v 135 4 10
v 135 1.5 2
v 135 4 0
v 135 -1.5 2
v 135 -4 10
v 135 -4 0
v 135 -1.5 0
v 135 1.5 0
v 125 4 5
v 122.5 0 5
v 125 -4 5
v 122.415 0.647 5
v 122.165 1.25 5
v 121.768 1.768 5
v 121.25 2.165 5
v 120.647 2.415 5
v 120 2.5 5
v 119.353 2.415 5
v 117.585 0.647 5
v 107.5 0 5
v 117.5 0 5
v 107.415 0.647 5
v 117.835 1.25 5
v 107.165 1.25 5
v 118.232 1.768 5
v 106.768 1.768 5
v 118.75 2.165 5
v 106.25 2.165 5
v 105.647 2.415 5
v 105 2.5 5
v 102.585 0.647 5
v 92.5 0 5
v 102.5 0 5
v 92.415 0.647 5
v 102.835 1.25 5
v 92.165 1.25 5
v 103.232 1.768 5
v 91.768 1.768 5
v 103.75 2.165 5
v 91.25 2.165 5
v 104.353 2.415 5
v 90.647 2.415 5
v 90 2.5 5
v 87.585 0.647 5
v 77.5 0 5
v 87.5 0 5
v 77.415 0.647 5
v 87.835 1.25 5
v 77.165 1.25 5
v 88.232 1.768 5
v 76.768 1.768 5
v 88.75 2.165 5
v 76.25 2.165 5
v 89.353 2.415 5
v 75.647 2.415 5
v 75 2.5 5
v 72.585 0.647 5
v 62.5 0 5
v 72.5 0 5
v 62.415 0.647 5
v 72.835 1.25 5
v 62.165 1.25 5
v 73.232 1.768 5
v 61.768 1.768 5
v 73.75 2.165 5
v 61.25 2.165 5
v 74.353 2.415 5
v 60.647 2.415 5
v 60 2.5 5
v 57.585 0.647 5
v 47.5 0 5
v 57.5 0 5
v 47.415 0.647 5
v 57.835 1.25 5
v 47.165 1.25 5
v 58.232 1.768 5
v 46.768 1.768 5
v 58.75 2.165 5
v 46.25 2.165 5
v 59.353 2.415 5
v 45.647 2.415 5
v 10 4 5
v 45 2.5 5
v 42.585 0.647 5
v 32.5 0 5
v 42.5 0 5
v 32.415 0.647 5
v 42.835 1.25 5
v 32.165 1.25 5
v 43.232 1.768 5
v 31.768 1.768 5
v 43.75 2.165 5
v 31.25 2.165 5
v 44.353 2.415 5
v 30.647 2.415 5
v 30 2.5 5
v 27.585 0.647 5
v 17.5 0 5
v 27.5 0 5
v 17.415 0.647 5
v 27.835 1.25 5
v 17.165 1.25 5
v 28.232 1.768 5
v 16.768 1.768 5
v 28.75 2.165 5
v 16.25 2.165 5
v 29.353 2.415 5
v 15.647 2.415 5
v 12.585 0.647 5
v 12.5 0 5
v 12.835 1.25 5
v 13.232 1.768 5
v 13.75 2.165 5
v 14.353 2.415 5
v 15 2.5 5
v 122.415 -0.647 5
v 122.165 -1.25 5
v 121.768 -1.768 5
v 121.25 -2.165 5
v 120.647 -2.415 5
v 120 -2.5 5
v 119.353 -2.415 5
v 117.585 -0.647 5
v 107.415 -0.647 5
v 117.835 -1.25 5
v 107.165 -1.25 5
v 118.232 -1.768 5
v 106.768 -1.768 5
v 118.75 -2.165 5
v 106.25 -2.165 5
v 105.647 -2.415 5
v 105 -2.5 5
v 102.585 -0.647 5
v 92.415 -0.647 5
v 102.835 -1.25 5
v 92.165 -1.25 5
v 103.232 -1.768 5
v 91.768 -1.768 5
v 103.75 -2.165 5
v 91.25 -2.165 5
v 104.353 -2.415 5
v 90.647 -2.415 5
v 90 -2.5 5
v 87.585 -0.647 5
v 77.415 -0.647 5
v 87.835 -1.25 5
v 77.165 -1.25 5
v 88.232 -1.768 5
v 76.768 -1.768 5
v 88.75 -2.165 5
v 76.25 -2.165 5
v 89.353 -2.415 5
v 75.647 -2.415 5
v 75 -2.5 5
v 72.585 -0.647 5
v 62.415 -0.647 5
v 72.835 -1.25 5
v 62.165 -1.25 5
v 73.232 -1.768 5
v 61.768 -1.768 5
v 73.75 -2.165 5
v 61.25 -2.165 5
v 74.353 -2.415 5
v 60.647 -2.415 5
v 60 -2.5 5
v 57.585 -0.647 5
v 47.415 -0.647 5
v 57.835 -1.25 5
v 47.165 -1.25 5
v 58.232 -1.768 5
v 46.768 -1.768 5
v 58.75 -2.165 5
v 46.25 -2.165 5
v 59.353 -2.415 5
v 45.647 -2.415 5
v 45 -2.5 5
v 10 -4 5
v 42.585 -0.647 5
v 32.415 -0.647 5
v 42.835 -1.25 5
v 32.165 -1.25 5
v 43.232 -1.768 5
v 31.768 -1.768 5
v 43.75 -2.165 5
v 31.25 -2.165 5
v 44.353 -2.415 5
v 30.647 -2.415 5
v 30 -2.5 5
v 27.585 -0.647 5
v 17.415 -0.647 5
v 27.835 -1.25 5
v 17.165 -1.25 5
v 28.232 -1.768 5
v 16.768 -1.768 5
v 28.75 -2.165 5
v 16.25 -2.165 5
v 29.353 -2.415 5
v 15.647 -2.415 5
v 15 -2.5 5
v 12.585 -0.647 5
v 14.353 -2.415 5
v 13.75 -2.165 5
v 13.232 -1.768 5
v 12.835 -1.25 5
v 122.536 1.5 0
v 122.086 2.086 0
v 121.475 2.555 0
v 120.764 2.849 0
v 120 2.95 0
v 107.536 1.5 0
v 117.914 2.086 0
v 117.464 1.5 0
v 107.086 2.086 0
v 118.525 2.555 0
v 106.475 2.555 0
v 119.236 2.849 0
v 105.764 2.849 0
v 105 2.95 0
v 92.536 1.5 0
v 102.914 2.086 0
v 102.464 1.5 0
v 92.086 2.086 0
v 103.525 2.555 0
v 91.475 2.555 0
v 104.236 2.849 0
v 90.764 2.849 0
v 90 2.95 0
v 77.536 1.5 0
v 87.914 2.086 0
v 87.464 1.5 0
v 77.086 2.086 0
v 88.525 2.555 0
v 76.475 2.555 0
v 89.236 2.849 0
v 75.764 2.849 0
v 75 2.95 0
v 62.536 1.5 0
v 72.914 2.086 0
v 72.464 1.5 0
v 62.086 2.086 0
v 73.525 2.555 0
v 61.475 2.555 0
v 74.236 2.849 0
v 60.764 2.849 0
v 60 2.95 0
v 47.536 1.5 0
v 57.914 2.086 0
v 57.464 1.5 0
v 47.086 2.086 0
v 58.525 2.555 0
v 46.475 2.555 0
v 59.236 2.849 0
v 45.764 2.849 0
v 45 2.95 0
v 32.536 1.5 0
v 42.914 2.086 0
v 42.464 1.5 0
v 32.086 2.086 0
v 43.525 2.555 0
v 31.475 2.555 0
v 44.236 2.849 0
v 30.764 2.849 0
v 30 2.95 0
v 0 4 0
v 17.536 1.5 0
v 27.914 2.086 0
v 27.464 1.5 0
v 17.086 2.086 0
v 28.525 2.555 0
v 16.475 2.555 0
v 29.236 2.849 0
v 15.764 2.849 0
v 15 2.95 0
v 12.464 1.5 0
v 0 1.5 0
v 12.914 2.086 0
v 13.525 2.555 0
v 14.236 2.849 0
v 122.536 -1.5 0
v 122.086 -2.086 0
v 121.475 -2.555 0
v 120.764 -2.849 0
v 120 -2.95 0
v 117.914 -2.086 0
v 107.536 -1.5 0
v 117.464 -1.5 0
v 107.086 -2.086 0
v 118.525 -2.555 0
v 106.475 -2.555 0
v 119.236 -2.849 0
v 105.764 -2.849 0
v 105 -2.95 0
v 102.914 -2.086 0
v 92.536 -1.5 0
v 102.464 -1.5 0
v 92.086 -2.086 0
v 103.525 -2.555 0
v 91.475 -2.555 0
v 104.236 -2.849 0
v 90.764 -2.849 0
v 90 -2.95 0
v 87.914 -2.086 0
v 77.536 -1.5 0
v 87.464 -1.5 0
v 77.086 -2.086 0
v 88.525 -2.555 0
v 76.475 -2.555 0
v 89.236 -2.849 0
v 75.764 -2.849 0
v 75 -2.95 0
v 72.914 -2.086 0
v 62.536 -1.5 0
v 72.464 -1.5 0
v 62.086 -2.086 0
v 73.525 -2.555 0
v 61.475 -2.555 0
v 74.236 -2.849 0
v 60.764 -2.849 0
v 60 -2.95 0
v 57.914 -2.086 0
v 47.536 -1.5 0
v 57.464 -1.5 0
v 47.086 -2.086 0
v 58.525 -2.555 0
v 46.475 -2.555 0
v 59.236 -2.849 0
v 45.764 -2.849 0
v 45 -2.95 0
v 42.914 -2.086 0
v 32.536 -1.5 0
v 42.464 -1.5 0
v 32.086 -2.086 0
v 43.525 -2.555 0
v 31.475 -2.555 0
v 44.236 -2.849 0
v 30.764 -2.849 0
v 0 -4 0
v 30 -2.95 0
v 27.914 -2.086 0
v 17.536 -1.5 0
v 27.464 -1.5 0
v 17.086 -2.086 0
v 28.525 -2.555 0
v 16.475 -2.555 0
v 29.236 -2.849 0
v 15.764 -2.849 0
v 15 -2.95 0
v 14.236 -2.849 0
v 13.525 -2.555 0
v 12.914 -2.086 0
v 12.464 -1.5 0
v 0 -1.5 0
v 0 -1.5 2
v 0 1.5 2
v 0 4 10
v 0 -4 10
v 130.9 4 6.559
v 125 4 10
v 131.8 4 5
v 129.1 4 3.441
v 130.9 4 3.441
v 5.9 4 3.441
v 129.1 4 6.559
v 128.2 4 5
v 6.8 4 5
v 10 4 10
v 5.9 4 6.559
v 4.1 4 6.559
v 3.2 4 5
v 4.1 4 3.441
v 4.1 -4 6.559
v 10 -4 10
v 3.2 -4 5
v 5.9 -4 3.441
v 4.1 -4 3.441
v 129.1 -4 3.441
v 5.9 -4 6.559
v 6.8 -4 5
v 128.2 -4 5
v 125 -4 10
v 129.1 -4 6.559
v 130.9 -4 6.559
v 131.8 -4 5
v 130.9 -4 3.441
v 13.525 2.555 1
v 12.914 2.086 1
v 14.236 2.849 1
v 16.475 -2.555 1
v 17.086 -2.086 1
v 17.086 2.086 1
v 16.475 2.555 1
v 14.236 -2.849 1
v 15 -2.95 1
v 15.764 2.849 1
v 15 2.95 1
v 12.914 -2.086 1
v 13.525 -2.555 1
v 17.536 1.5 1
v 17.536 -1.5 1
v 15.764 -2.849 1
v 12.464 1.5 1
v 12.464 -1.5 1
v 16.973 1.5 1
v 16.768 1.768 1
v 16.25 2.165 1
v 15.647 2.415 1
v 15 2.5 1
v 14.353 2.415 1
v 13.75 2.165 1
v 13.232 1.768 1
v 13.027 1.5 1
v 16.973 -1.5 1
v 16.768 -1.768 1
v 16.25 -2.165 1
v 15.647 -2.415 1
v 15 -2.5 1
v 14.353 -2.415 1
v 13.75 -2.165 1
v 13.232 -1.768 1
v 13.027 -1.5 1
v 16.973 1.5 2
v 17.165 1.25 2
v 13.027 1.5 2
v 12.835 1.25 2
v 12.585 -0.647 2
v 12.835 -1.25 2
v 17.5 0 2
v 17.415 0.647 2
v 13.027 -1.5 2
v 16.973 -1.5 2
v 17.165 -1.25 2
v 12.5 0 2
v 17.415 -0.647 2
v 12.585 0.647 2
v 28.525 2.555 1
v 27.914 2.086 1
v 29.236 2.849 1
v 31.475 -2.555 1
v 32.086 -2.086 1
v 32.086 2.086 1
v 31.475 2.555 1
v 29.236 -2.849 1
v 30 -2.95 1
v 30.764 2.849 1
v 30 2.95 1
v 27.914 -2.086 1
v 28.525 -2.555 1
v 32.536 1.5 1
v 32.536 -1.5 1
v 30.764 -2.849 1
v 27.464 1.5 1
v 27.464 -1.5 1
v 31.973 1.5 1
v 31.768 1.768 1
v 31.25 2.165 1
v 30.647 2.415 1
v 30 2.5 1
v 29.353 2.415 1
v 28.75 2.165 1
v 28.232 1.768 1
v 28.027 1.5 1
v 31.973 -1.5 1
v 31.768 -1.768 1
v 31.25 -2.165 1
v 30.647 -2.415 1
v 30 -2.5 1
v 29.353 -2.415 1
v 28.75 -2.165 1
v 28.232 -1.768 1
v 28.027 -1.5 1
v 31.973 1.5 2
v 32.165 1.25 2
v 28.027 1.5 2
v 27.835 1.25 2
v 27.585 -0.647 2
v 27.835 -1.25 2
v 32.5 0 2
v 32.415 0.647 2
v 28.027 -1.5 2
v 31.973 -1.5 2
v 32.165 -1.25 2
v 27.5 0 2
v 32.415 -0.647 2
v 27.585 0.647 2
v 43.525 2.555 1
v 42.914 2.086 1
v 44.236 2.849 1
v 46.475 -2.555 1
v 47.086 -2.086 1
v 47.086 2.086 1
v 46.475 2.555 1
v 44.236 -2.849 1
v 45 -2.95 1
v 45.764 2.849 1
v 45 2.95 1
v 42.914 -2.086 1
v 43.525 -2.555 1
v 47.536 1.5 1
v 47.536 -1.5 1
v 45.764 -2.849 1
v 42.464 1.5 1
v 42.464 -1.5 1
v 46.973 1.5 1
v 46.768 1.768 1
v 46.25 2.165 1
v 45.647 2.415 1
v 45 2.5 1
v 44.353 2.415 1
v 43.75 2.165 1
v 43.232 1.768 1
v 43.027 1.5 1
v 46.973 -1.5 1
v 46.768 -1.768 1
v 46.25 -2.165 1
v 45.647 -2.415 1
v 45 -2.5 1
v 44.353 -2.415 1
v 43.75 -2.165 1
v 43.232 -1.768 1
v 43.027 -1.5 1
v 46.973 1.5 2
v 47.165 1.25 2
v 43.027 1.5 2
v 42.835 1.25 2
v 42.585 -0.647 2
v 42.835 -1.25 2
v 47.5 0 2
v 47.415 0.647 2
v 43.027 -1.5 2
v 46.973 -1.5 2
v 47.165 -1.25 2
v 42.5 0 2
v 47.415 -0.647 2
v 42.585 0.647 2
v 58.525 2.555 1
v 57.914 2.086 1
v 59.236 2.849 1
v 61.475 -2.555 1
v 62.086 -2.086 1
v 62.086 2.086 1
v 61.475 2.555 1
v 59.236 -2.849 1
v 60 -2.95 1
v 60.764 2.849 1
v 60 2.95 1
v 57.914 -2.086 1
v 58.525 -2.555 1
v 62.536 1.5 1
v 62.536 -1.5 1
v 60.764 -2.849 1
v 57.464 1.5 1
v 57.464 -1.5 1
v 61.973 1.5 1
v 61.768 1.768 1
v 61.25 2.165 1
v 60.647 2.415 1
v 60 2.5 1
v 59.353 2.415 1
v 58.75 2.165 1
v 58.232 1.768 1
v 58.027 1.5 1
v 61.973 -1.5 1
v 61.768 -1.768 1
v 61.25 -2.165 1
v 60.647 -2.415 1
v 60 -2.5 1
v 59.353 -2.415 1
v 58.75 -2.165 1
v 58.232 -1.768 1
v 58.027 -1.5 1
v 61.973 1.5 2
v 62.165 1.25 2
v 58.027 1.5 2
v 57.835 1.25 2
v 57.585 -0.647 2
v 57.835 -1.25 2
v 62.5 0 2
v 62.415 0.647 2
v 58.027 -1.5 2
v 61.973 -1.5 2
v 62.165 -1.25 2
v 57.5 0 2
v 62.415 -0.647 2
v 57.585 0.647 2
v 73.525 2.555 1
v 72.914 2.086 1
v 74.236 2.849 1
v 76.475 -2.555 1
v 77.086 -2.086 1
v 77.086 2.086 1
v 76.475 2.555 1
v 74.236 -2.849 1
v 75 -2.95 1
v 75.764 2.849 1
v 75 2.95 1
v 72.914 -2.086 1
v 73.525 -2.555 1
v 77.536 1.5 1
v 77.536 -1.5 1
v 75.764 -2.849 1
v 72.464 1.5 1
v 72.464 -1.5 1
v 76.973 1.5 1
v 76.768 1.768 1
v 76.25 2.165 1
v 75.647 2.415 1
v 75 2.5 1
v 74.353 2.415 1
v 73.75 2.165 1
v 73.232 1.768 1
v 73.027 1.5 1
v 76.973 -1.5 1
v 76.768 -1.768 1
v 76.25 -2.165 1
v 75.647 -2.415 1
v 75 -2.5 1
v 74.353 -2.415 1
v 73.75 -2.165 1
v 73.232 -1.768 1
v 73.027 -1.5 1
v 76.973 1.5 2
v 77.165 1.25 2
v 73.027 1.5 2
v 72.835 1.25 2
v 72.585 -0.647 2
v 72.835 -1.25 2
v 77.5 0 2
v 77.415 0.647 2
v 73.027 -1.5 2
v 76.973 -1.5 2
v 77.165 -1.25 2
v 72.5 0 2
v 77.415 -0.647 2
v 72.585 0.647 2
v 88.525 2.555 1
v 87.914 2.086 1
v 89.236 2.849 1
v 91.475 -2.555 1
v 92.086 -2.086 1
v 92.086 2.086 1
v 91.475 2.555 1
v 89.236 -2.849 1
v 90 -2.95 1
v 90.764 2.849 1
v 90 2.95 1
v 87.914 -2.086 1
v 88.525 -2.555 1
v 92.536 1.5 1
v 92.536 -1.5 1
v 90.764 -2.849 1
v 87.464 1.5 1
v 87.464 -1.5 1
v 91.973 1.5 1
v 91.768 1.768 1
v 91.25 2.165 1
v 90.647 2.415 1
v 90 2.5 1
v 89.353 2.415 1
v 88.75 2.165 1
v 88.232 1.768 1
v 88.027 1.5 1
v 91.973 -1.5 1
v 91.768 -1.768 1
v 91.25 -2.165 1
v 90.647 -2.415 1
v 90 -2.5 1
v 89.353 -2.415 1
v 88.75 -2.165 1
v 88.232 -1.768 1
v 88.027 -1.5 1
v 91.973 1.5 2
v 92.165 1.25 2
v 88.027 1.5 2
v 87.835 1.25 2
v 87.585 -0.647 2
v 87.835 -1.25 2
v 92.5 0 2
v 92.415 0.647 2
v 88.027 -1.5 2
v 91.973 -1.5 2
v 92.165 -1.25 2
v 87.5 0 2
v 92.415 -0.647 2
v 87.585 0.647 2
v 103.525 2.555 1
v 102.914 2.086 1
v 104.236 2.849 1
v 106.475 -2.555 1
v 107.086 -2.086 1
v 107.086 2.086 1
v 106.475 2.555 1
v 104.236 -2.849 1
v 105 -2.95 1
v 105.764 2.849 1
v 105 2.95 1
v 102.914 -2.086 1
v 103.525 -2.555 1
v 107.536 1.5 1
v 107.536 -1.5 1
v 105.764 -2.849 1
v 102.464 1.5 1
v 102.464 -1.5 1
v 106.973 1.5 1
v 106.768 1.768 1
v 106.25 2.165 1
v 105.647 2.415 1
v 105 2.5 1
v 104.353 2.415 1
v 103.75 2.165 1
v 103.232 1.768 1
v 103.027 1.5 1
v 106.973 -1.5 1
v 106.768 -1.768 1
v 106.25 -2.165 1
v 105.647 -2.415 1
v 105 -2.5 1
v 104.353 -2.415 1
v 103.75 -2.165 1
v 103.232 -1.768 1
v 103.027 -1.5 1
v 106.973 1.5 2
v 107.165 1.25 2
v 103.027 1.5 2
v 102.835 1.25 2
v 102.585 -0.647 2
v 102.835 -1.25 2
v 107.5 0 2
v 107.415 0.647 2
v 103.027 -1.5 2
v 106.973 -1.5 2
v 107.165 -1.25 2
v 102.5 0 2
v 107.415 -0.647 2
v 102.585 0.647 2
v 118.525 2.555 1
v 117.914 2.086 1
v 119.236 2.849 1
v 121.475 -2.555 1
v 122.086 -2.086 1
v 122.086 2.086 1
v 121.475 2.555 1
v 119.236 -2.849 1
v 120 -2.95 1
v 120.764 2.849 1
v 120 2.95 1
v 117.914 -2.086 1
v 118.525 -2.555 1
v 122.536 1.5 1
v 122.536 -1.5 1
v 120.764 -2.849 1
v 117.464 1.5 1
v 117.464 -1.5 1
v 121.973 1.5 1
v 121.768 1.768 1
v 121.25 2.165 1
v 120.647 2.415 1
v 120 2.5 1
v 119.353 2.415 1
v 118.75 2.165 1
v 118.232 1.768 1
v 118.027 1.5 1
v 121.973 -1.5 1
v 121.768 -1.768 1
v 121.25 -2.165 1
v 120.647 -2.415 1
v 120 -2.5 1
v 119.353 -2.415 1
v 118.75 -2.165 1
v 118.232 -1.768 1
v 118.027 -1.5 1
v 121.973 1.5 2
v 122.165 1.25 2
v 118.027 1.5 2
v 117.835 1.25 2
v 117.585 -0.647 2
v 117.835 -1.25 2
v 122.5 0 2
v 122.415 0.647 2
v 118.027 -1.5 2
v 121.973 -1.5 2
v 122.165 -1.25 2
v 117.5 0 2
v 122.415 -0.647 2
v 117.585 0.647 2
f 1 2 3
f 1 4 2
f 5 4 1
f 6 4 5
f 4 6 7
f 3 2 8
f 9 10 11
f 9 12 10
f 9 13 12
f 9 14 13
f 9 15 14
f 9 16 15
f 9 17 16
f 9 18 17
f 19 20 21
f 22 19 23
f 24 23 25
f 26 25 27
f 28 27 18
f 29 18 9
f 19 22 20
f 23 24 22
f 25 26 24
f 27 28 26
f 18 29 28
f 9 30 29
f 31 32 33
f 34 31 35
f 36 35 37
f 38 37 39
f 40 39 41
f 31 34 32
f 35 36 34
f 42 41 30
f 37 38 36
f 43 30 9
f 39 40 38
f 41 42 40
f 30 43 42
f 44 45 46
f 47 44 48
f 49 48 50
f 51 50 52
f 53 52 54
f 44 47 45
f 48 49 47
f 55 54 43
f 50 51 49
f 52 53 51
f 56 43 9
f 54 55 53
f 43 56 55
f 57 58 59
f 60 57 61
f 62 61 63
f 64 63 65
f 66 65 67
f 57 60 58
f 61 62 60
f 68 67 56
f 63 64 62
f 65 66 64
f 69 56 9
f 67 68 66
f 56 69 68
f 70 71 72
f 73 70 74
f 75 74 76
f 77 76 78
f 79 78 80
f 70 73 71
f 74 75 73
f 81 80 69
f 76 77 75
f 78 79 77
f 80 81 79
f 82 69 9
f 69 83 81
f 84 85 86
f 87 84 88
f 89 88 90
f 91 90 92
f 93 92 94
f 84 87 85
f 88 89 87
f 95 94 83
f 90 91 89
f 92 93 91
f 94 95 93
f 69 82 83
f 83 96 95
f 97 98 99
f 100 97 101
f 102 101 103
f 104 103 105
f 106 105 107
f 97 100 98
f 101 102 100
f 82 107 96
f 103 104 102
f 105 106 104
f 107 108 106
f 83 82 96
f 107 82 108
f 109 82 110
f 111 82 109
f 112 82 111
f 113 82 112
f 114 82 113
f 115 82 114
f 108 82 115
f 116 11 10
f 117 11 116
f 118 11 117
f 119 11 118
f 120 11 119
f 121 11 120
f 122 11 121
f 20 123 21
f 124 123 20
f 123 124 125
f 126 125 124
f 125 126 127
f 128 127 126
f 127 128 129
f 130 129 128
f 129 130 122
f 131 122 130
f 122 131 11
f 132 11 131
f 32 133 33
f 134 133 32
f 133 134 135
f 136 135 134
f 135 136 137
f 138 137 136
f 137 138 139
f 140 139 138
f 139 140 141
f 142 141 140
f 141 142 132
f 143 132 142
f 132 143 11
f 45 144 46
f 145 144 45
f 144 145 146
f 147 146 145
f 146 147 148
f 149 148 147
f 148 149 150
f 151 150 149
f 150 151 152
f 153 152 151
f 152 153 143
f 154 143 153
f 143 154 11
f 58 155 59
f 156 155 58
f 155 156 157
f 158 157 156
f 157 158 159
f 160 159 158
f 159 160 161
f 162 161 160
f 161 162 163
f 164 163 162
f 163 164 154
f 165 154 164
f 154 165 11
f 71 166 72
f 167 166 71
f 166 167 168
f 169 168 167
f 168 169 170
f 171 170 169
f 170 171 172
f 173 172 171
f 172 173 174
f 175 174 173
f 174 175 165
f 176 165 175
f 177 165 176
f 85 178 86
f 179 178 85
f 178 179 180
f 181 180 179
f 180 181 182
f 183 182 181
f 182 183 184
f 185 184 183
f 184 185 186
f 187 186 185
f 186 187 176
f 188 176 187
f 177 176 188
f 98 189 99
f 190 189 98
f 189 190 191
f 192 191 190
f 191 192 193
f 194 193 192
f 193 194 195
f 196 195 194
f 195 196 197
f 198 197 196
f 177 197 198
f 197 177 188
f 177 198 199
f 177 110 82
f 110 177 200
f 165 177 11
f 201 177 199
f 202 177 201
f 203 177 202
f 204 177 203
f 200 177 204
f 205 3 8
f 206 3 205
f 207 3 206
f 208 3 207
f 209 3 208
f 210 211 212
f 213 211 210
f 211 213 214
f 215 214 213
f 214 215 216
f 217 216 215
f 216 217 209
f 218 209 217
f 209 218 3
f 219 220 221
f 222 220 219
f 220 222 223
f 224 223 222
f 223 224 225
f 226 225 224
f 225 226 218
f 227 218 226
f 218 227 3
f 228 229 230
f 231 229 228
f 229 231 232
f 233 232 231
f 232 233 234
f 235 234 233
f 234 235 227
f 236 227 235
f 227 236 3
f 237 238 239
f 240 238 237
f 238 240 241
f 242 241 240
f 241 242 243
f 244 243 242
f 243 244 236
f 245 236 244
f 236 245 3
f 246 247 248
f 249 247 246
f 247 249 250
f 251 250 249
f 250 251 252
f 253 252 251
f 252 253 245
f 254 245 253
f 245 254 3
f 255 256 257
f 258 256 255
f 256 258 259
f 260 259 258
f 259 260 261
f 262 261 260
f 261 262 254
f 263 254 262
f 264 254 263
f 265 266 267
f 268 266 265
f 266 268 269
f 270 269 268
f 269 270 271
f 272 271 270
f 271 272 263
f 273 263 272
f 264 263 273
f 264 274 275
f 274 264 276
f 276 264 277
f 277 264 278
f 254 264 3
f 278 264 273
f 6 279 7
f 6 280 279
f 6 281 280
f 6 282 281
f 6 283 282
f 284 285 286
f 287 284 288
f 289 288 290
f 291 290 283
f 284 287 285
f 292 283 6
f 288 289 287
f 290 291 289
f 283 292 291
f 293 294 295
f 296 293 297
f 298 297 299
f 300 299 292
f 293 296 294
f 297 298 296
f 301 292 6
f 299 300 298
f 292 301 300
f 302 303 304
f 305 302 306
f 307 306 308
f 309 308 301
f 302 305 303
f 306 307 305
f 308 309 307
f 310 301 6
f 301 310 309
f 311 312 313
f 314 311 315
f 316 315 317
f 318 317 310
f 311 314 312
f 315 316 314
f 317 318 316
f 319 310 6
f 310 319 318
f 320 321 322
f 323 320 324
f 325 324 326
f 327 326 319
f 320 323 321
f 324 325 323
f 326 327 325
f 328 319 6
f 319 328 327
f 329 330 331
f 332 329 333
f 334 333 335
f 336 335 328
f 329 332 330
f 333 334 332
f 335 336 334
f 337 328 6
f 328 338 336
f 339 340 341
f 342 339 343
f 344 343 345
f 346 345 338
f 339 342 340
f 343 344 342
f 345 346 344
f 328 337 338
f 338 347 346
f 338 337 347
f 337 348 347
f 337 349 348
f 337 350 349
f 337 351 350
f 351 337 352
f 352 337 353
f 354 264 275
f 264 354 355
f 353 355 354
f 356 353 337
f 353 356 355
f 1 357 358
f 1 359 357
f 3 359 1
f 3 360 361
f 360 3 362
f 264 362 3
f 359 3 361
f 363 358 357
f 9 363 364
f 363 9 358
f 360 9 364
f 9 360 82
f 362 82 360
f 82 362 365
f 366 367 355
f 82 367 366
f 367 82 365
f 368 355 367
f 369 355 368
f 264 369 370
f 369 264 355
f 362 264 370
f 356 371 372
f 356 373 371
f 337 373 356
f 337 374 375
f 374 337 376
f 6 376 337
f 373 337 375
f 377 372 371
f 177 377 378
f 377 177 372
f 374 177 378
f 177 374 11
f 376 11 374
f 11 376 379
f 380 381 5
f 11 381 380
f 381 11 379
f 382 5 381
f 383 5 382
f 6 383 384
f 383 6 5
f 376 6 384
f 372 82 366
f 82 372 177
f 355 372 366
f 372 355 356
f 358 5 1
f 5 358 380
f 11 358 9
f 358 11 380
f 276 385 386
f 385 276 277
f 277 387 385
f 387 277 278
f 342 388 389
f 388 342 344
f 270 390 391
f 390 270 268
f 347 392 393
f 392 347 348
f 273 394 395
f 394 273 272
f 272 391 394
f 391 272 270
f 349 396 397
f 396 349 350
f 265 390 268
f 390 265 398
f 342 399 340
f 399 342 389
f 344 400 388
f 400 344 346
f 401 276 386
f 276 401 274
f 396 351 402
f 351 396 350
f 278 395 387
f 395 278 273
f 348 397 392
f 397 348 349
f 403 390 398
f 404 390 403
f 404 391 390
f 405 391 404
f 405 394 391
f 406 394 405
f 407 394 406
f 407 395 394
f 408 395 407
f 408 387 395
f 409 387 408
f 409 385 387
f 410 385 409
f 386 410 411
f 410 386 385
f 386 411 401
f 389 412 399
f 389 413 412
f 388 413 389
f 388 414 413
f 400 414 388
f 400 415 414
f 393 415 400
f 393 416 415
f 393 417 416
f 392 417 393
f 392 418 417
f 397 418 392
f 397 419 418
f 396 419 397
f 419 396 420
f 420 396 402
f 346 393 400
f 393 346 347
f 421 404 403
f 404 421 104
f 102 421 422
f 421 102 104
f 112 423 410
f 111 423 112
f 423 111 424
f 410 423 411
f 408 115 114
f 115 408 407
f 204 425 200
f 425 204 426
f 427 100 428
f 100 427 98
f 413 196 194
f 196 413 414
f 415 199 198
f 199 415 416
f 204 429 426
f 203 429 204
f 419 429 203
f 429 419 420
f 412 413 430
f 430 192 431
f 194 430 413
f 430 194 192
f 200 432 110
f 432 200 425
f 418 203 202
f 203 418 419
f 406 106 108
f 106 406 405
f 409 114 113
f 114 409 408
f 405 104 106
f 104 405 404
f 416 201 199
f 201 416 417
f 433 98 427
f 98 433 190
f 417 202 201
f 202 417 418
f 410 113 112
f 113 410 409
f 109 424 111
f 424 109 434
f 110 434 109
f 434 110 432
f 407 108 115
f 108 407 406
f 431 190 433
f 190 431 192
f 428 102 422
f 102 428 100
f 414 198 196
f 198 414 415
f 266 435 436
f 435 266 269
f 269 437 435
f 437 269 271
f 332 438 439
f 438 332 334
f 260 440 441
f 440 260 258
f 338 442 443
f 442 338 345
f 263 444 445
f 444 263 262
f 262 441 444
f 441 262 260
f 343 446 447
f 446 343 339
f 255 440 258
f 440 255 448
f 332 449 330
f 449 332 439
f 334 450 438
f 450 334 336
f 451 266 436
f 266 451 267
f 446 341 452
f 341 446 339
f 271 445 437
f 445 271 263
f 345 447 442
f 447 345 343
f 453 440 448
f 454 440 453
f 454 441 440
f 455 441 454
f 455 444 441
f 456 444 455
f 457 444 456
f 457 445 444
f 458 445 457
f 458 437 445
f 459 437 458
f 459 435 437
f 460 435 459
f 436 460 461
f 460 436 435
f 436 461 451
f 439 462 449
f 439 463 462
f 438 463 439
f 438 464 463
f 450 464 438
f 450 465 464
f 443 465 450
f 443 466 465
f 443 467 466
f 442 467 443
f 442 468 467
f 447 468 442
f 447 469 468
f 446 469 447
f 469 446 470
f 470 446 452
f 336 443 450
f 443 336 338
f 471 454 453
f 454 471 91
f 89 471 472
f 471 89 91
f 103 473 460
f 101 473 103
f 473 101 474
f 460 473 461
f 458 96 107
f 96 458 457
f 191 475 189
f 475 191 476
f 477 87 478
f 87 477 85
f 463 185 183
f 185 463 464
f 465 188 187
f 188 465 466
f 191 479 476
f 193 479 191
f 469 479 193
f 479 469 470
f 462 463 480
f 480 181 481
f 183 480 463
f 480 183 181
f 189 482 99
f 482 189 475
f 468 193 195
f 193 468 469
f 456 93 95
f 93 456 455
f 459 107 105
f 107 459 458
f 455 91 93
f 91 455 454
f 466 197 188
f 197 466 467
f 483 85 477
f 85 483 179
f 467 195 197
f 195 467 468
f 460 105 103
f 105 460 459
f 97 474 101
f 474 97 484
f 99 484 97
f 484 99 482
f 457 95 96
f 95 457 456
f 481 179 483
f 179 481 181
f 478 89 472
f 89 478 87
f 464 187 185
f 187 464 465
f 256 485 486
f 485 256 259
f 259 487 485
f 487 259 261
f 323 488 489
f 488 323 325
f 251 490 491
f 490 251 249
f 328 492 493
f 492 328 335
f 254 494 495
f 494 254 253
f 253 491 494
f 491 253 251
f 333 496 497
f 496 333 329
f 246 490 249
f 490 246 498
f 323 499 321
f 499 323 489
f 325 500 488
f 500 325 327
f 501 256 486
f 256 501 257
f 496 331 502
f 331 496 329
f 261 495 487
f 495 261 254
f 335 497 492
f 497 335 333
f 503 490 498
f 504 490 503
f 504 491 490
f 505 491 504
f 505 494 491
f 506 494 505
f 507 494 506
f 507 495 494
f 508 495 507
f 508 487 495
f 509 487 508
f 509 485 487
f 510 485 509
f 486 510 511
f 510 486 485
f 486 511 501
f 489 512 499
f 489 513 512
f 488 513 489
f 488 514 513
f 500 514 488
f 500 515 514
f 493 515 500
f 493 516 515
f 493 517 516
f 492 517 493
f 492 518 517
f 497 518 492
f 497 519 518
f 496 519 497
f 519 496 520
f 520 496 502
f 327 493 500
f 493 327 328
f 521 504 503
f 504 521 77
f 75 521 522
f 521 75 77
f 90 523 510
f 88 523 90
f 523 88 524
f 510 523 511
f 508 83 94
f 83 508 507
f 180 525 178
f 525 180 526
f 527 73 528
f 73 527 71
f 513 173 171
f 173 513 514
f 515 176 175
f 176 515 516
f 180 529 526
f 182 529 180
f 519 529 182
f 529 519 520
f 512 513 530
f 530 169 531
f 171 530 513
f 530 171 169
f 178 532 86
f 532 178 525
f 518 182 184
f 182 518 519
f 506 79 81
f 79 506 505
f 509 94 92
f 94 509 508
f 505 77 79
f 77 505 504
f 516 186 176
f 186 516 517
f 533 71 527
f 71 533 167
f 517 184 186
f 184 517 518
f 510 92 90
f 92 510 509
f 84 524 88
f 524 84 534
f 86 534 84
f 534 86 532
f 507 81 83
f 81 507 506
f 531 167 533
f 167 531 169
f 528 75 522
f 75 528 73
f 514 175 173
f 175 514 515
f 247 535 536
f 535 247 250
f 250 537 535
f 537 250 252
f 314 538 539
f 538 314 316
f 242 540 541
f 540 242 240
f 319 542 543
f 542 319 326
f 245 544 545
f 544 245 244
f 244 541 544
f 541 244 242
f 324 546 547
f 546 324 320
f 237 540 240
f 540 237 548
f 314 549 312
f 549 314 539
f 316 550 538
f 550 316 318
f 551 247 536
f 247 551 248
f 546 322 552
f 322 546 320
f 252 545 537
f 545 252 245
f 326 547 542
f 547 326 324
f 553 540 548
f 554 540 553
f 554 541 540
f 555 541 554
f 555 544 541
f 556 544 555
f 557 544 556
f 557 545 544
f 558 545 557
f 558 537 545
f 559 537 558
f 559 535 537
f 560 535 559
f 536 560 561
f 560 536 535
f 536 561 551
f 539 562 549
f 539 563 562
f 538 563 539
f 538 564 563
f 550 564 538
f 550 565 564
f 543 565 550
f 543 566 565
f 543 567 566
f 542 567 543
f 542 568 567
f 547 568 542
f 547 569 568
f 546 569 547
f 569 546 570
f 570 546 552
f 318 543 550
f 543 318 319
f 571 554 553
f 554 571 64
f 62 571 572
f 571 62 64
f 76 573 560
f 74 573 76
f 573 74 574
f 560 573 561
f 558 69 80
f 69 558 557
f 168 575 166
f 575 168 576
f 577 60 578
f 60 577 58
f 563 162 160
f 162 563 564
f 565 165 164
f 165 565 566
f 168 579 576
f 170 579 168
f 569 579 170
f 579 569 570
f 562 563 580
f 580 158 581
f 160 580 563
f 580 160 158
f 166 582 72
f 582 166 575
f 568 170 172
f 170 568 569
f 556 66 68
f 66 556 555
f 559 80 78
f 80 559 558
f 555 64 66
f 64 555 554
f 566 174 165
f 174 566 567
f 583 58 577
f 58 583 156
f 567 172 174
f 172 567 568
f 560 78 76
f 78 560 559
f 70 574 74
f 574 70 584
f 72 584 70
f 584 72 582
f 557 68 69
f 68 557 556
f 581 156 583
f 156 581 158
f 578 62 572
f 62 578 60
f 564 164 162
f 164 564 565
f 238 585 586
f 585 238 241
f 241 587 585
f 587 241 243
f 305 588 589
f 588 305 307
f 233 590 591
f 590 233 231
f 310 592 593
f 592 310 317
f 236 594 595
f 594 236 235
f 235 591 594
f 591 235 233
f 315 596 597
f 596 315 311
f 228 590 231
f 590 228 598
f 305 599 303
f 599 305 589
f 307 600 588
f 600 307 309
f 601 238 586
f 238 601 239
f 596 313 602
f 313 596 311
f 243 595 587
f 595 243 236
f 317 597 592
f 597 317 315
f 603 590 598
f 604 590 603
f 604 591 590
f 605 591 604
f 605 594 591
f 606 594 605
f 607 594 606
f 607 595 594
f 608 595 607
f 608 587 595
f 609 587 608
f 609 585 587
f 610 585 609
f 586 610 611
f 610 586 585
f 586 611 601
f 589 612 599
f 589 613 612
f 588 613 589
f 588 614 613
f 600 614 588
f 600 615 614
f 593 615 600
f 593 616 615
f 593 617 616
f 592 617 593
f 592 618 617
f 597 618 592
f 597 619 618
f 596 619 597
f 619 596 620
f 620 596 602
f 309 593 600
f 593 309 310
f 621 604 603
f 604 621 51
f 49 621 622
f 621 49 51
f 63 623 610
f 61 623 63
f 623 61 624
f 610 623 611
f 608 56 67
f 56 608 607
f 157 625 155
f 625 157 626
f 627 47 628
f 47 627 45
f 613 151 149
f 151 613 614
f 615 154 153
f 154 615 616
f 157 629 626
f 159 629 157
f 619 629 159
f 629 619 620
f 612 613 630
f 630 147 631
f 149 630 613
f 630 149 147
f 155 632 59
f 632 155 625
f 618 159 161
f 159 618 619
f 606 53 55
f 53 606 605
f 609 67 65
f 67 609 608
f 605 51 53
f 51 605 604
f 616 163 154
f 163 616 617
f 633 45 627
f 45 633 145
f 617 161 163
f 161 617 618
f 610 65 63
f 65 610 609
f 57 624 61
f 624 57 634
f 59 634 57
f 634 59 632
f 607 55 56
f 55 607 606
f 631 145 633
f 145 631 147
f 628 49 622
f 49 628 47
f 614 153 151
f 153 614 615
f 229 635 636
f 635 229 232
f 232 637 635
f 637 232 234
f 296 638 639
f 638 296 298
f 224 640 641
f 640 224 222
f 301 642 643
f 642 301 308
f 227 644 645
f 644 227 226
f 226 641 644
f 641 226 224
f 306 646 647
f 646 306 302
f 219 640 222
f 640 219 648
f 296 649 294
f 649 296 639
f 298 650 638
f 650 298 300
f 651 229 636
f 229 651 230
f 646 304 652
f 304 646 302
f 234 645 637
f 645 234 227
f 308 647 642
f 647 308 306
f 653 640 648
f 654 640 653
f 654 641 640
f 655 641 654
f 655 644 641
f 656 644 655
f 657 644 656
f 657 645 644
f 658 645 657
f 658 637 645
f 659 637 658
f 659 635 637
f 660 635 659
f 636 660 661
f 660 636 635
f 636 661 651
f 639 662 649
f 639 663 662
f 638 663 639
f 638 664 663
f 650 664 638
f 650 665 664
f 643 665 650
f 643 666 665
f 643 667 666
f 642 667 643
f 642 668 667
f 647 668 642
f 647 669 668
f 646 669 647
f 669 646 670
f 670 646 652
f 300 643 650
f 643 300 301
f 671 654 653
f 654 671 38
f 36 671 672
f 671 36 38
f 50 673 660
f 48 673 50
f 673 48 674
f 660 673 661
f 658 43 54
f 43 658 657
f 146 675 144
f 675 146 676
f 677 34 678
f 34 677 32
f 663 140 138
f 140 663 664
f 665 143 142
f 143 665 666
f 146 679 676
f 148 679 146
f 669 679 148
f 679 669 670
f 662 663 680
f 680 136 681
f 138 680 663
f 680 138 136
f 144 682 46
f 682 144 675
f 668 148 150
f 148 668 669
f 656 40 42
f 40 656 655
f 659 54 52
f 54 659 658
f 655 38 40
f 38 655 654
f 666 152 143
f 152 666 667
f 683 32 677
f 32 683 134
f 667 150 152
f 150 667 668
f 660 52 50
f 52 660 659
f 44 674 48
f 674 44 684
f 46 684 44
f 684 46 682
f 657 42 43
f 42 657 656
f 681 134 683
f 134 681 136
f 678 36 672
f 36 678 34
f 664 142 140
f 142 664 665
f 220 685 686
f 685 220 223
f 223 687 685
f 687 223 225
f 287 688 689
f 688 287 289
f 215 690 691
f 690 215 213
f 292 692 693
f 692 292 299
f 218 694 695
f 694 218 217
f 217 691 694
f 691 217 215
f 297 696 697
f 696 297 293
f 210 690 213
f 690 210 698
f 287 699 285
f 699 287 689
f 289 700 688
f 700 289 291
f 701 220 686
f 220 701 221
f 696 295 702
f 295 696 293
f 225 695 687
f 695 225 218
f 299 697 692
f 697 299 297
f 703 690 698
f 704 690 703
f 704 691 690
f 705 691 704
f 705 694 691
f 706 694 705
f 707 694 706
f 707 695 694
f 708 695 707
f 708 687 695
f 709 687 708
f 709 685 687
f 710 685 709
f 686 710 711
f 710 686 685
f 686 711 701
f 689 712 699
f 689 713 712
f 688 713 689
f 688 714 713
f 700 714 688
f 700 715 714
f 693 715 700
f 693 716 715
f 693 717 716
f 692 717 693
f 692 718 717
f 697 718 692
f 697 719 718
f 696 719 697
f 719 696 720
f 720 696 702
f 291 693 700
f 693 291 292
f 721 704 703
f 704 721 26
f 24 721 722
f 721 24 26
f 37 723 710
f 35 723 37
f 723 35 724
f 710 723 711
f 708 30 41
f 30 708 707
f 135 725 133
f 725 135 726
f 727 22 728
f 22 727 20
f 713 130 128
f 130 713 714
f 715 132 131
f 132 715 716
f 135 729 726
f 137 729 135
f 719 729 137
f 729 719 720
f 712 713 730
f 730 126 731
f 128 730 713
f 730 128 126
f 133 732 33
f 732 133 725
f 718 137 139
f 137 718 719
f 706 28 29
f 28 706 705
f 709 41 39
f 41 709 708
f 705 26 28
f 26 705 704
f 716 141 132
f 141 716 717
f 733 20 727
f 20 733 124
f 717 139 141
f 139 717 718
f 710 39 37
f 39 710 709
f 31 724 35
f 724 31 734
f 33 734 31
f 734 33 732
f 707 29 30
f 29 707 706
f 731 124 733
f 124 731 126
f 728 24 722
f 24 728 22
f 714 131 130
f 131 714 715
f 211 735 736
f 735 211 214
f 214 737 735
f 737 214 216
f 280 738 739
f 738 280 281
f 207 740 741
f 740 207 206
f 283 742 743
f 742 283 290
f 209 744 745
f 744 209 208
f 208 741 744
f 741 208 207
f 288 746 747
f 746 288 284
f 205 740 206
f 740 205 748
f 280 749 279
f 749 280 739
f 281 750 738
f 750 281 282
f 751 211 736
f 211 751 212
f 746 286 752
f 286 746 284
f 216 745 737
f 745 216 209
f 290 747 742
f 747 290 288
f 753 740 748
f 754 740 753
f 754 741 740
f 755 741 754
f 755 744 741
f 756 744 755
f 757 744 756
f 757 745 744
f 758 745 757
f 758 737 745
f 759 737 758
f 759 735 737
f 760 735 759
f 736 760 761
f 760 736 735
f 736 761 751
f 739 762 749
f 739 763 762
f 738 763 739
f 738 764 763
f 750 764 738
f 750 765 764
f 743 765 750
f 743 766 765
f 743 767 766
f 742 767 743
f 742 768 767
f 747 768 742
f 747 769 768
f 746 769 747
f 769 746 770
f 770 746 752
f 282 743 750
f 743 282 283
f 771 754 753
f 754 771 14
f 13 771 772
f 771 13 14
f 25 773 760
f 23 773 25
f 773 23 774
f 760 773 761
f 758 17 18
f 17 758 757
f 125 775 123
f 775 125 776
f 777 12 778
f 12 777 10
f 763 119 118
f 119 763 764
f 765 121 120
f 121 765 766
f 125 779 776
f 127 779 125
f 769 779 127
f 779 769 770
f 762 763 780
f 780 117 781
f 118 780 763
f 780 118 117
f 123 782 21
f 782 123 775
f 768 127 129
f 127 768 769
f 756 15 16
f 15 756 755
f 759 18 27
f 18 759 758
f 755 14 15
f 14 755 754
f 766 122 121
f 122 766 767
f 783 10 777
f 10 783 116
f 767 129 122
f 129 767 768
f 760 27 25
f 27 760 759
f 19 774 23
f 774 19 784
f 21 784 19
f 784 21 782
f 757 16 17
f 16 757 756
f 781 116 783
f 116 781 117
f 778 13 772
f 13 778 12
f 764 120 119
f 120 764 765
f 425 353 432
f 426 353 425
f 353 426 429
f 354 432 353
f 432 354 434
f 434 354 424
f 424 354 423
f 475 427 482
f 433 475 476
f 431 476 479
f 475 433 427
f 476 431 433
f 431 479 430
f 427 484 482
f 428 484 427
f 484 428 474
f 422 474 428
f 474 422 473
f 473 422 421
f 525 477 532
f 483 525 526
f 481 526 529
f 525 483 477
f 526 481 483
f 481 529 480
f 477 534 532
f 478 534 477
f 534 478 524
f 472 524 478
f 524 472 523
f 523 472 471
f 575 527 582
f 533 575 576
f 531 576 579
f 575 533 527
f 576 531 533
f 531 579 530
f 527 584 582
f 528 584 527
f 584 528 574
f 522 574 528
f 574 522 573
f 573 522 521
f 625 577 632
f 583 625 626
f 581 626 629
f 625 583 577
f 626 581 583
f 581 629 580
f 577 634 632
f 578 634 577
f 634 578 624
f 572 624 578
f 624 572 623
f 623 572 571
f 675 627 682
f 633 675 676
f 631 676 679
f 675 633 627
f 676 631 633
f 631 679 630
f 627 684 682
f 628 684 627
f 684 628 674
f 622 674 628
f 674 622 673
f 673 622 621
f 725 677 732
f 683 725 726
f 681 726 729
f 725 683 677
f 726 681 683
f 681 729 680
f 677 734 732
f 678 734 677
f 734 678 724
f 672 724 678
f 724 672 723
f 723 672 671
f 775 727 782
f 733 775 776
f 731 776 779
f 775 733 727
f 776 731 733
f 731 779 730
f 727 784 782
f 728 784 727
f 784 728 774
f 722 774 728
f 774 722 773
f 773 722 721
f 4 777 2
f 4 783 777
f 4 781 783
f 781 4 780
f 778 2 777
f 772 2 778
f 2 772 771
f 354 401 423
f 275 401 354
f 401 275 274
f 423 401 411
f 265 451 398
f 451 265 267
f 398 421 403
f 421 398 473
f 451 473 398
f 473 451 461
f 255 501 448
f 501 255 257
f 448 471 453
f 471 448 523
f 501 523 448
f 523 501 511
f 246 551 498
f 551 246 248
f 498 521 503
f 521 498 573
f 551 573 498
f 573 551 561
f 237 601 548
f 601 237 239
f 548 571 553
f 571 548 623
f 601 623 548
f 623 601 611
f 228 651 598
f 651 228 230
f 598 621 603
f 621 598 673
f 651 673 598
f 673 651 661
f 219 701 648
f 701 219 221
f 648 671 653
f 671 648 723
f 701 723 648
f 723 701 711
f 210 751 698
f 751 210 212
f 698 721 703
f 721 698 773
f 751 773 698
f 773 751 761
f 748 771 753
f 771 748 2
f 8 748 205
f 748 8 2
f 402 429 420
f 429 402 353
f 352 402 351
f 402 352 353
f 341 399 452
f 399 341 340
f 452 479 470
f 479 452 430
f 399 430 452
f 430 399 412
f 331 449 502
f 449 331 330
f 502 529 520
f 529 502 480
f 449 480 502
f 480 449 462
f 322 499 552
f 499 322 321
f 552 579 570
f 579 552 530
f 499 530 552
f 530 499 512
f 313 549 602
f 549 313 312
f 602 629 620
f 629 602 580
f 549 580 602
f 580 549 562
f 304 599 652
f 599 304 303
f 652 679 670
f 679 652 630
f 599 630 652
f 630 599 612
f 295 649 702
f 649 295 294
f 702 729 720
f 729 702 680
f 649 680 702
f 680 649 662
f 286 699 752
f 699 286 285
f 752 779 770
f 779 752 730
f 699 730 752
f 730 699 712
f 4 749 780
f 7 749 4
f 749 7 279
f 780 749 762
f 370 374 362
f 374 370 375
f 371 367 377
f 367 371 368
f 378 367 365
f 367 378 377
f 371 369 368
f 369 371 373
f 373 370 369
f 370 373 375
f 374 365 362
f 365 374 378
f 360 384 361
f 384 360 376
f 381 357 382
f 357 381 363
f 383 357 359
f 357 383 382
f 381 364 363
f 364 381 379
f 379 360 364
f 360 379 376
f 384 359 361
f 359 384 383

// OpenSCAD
number_of_Leds = 8;

module LED()
{
    cylinder(r=2.95, h=1, $fn=24);
    hull()
    {
    translate([0,0,1])cylinder(r=2.5, h=5.1, $fn=24);
    translate([0,0,6.1])sphere(r=2.5, $fn=24);
    }
}

render(10)
difference()
{
    union(){
        translate([0,-4,0])cube([15*number_of_Leds+15,8,5]);
        translate([0,-4,0])cube([10,8,10]);
        translate([15*number_of_Leds+5,-4,0])cube([10,8,10]);
    }
    for (x=[1:number_of_Leds])
    {
        translate([15*x,0,0])LED();
    }
    translate([0,-1.5,0])cube([15*number_of_Leds+20,3,2]);
    
    //screwholes
    translate([5,5,5])rotate([90,0,0])cylinder(r=1.8,h=10);
    translate([15*number_of_Leds + 10,5,5])rotate([90,0,0])cylinder(r=1.8,h=10);
}
